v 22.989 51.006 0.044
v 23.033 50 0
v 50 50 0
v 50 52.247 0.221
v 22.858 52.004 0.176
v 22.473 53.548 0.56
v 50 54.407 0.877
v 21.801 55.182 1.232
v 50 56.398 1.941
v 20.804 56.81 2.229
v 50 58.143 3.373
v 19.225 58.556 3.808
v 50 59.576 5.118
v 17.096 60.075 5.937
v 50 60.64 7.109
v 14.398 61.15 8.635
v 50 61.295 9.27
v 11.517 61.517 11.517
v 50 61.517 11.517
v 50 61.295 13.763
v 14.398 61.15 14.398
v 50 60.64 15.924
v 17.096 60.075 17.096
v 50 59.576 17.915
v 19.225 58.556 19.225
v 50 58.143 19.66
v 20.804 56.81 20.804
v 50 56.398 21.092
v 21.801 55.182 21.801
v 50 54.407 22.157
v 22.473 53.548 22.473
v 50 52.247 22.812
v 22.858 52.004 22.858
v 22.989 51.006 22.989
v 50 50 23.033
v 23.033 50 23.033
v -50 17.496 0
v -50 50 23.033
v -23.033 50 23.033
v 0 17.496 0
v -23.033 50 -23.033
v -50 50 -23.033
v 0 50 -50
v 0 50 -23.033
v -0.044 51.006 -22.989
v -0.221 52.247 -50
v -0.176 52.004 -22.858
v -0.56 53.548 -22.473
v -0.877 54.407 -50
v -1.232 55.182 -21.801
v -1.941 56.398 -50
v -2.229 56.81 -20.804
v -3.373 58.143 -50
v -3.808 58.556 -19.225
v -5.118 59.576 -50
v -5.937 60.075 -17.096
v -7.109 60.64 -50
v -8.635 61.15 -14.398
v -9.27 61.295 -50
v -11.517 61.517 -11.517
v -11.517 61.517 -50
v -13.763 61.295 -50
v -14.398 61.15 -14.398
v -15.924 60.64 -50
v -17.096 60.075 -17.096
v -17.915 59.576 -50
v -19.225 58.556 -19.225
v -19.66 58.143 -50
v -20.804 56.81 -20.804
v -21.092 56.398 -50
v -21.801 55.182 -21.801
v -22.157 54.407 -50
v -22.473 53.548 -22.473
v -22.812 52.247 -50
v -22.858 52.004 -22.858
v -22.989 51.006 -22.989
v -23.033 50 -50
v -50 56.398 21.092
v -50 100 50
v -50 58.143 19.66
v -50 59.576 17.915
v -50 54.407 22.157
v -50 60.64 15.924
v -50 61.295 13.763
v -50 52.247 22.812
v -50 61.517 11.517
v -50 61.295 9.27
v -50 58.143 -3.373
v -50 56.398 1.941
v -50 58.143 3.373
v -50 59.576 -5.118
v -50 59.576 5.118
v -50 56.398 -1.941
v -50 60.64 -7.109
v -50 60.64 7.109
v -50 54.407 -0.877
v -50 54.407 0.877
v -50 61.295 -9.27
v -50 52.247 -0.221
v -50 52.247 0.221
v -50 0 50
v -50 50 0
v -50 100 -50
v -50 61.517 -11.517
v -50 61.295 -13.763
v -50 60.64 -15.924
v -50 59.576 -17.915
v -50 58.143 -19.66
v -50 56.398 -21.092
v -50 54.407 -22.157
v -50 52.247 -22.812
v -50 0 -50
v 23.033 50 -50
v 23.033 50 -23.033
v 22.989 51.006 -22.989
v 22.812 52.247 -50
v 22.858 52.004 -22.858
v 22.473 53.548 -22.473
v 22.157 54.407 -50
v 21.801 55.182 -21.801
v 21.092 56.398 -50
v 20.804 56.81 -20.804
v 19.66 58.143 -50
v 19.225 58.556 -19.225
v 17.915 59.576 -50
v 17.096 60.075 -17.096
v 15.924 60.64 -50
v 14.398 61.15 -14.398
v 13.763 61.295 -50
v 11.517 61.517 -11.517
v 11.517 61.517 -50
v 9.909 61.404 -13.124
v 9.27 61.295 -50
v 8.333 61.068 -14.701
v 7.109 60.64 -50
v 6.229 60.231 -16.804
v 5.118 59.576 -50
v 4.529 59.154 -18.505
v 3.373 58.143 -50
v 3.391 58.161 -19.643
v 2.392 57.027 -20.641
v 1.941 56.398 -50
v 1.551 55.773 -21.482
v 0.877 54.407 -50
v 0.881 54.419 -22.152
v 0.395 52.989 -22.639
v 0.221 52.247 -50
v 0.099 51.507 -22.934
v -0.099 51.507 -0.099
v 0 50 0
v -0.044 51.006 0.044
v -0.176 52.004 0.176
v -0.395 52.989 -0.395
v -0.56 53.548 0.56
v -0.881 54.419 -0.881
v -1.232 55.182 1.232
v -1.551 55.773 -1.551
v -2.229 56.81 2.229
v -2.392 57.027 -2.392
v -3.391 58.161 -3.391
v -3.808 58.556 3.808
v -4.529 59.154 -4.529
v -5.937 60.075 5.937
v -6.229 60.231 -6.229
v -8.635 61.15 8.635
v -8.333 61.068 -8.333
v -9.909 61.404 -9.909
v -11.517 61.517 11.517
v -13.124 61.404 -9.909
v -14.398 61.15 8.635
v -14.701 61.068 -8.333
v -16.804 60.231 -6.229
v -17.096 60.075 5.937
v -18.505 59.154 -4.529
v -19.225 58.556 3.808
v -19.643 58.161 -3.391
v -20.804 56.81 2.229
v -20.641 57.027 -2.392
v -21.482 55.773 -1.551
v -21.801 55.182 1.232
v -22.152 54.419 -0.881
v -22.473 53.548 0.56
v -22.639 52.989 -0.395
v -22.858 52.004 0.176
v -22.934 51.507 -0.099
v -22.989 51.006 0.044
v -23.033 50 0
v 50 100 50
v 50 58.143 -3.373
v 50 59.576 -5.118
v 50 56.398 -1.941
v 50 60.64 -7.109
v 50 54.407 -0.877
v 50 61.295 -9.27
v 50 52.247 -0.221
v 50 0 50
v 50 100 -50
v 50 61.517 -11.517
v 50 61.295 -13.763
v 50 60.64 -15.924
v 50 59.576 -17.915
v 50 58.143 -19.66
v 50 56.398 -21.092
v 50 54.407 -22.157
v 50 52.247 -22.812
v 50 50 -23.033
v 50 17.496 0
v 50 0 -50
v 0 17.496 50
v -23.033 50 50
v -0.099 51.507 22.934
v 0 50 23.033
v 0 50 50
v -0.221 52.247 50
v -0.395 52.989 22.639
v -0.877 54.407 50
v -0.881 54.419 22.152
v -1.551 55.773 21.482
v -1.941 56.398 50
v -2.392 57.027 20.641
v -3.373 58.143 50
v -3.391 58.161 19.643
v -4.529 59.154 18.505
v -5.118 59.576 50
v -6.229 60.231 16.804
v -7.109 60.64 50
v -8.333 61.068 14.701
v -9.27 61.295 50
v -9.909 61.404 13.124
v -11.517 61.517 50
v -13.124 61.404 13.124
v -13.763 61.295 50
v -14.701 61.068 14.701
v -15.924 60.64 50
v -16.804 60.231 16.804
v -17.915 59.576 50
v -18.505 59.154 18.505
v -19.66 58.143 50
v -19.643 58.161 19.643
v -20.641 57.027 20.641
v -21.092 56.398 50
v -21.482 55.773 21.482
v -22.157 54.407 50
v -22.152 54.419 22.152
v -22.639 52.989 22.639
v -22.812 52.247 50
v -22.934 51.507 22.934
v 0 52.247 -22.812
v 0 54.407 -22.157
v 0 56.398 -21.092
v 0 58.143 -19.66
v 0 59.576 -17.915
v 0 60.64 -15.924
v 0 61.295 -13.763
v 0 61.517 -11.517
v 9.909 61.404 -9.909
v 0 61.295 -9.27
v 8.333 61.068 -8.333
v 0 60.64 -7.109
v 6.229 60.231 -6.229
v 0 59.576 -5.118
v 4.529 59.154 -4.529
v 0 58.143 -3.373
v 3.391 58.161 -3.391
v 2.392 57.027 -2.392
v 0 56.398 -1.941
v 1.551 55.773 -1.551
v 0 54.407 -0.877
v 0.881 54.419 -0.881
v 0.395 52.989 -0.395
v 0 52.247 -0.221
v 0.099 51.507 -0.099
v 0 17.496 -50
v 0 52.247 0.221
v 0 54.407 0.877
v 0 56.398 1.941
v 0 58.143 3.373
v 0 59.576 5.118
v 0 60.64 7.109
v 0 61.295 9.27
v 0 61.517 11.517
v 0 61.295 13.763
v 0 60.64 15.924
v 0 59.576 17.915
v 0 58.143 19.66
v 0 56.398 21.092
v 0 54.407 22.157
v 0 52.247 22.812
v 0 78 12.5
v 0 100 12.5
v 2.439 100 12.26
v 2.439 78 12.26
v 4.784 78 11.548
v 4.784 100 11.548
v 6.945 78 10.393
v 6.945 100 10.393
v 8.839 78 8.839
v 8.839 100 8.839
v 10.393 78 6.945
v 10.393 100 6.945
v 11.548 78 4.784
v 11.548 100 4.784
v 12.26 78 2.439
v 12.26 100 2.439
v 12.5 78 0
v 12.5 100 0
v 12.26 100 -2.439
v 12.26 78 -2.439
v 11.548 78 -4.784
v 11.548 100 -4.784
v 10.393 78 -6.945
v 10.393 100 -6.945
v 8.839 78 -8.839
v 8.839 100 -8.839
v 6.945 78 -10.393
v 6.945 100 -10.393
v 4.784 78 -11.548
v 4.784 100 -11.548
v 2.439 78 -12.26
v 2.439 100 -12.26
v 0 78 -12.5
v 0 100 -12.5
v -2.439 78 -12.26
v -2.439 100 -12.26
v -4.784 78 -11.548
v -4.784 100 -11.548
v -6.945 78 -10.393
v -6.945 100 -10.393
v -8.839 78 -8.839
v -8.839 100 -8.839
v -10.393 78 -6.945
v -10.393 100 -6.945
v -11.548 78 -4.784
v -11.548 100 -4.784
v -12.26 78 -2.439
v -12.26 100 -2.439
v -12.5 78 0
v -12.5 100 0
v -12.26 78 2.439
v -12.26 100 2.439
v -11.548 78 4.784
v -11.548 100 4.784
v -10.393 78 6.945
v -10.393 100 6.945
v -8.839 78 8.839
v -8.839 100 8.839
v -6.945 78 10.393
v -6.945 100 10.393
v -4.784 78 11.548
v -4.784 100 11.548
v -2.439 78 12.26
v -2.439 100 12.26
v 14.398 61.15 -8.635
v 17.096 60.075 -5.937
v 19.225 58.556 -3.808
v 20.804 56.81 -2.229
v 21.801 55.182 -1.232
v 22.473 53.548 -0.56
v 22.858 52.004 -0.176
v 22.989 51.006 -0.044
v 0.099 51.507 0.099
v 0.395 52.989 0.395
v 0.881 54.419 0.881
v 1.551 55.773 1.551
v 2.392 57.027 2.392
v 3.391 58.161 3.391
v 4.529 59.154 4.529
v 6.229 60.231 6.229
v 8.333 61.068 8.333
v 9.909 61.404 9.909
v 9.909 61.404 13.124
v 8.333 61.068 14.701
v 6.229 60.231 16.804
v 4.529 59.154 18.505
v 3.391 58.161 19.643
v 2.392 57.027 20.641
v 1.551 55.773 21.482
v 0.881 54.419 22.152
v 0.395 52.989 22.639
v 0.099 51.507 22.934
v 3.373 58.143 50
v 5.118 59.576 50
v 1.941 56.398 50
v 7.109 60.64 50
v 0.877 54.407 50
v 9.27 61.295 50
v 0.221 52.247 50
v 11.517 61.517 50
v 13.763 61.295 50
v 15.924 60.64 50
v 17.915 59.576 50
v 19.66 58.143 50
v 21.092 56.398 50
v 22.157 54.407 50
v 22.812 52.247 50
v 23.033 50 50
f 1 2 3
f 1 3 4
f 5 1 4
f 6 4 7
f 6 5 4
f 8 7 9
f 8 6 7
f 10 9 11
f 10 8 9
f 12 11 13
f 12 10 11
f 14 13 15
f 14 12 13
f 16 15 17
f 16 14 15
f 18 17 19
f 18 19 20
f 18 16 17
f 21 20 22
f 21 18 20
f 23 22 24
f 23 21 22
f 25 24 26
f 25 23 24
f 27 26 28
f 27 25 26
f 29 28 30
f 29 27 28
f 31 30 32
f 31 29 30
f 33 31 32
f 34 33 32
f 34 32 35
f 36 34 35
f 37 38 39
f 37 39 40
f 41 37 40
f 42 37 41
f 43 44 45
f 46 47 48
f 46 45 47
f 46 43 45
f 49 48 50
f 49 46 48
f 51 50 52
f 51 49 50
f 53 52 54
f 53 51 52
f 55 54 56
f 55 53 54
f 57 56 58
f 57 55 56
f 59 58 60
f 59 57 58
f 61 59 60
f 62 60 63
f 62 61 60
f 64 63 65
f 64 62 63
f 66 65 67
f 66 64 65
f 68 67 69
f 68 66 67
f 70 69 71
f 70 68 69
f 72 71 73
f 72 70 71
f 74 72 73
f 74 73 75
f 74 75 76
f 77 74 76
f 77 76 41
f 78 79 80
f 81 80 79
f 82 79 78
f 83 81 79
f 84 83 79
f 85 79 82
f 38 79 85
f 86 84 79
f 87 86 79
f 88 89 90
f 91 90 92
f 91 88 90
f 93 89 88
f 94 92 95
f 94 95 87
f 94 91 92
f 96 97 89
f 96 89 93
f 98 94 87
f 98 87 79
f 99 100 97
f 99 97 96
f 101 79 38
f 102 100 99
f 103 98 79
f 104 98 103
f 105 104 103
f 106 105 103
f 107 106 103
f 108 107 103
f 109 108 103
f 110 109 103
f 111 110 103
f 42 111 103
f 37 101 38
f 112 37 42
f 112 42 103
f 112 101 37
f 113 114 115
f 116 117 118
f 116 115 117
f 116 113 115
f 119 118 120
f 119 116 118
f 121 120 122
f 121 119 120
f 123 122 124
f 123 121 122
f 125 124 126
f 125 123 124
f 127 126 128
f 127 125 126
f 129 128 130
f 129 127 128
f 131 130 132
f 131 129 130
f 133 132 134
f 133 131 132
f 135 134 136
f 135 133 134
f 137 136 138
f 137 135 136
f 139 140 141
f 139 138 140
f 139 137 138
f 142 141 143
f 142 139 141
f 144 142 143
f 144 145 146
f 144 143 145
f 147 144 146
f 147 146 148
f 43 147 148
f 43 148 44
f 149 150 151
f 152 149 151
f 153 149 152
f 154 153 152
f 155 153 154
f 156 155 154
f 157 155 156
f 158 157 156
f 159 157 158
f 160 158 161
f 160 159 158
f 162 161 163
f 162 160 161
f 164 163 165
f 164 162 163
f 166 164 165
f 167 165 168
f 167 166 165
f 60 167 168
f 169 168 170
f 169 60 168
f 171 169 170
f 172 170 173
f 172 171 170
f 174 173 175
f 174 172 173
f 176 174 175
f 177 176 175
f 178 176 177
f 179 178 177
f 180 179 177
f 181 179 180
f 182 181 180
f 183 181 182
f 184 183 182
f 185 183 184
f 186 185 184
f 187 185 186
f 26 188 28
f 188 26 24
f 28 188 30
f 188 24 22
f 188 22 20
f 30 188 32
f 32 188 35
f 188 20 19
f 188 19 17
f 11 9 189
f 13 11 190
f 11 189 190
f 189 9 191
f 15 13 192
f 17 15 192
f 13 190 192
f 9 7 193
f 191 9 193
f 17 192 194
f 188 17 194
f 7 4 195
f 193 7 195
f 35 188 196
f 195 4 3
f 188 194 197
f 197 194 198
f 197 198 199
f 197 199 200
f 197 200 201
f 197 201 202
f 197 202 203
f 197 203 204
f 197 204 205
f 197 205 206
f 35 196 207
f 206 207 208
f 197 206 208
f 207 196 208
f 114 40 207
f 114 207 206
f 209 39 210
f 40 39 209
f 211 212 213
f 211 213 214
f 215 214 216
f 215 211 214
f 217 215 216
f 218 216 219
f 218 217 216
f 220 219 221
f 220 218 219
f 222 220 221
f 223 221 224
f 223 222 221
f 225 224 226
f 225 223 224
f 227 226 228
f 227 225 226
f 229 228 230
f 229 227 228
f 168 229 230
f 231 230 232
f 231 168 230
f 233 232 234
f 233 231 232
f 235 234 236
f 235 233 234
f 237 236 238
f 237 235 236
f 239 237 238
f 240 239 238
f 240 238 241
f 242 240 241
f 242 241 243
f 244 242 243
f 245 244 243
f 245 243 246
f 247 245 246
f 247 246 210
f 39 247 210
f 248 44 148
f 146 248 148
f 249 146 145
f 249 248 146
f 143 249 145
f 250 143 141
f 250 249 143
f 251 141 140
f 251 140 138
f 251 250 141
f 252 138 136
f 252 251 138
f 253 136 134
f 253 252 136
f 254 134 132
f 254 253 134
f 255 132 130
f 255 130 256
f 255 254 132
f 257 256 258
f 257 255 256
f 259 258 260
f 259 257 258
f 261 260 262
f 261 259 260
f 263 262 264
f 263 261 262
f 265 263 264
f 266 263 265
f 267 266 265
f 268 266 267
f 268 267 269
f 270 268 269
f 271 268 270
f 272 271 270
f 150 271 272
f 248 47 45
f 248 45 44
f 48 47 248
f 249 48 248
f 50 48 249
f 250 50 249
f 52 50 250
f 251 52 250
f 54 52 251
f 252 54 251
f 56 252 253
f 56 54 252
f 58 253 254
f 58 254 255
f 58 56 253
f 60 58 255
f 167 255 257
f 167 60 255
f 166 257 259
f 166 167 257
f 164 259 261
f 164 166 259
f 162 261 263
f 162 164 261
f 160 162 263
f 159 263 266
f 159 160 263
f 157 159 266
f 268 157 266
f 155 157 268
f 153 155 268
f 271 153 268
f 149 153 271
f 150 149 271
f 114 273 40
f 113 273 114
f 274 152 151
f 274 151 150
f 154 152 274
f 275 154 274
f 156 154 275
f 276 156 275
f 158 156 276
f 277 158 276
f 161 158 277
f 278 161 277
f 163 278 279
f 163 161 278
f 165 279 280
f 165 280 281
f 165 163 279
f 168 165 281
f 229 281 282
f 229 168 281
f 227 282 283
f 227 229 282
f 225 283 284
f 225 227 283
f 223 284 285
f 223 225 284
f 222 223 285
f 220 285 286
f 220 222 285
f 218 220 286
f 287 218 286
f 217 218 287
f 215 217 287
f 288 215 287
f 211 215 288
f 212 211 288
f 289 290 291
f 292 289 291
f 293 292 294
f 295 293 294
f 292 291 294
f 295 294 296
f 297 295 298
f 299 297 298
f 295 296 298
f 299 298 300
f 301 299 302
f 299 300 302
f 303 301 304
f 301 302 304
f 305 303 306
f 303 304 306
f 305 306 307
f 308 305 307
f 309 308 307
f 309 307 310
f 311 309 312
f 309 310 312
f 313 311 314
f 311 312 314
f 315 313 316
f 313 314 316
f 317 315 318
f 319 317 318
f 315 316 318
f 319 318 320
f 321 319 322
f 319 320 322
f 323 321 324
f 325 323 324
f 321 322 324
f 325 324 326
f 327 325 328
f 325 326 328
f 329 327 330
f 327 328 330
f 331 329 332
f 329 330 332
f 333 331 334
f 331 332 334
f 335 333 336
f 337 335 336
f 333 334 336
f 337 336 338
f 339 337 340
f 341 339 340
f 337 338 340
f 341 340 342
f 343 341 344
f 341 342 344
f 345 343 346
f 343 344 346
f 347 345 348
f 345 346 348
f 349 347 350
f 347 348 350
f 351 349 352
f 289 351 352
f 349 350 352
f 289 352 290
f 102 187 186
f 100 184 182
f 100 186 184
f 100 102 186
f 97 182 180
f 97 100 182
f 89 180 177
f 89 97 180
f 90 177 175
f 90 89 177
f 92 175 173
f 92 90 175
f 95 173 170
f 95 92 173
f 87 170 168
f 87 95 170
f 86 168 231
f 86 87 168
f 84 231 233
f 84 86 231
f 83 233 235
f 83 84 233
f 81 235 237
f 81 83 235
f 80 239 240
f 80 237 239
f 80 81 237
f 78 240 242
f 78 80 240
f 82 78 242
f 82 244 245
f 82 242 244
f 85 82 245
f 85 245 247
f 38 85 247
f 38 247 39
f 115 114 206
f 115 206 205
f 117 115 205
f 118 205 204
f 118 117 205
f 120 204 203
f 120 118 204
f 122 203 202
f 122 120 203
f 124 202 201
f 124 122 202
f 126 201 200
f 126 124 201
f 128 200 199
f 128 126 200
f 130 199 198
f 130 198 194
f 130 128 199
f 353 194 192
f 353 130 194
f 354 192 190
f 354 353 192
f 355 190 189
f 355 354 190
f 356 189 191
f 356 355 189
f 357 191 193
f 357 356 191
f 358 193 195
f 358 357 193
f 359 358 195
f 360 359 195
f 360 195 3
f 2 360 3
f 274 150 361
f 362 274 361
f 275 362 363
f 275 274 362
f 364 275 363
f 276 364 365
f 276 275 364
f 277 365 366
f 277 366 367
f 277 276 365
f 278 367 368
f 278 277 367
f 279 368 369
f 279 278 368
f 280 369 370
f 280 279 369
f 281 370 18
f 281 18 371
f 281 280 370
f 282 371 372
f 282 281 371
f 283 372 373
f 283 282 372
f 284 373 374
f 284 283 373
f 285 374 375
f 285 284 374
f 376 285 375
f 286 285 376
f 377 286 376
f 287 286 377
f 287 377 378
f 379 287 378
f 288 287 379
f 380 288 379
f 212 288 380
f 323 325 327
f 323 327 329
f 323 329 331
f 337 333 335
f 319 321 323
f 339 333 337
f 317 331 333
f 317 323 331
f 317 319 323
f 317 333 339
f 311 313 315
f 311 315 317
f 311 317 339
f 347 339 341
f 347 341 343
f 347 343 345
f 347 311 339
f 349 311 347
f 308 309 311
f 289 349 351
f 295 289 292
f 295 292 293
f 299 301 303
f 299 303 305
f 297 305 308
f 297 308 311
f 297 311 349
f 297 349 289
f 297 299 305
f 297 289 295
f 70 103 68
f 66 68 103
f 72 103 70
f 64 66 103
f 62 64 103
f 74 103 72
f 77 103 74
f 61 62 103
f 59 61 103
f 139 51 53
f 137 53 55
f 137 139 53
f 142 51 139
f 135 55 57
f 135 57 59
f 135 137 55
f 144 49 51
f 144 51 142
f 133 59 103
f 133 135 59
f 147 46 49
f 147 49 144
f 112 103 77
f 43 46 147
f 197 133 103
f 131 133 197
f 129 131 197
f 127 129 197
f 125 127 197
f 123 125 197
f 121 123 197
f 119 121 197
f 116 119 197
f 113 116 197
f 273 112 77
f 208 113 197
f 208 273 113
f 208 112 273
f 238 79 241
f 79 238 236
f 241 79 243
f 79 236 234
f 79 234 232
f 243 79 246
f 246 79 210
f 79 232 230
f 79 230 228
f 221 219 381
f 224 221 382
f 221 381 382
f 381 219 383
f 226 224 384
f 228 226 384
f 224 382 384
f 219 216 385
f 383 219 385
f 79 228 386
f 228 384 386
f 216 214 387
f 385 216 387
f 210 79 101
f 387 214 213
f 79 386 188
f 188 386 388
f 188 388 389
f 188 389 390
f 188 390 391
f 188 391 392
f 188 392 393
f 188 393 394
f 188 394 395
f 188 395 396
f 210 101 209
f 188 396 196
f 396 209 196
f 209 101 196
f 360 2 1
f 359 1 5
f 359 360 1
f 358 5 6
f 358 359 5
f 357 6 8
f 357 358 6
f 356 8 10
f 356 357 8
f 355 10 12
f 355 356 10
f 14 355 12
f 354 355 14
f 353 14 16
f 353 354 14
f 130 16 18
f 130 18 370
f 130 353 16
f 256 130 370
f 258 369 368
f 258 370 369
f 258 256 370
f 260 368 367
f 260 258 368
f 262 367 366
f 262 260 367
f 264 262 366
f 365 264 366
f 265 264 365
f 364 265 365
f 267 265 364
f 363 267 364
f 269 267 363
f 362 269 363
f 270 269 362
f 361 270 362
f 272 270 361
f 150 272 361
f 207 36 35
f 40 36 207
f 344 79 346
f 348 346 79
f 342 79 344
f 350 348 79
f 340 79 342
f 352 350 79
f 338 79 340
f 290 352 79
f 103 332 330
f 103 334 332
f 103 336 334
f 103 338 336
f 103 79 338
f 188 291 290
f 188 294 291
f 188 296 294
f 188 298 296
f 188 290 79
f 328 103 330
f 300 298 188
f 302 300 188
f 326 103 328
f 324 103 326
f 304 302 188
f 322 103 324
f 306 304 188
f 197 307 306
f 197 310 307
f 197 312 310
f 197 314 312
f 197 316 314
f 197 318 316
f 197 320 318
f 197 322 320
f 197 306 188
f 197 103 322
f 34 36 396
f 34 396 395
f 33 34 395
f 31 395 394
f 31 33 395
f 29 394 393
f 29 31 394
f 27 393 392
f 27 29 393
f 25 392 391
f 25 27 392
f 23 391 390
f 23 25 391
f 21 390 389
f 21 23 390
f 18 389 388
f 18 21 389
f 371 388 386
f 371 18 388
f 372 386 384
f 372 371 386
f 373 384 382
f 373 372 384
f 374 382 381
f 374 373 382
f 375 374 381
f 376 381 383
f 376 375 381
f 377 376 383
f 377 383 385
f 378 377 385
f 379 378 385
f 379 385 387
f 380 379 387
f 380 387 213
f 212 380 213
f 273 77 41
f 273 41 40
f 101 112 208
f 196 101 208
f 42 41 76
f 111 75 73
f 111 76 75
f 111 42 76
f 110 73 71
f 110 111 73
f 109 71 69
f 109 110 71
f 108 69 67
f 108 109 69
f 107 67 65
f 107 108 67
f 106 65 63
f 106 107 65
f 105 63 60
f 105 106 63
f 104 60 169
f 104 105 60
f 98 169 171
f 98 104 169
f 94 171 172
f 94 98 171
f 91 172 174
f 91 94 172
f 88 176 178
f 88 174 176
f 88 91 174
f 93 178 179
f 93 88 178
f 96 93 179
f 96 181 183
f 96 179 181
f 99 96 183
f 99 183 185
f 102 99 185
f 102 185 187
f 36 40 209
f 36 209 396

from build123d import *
from build123d.topology import SkipClean

# Parameters (mm, degrees)
SKETCH1_W           = 100
SKETCH1_H           = 100
BOSS_EXTRUDE1_DEPTH = 100
CUT_EXTRUDE1_DEPTH  = 50
CIRPATTERN1_START   = -50
CIRPATTERN1_DEPTH   = 100
CIRPATTERN1_2_DEPTH = 50
SKETCH3_R           = 12.5
CUT_EXTRUDE2_DEPTH  = 22


with BuildPart() as part:
    # Sketch1 → Boss-Extrude1 (new body)
    with BuildSketch(Plane(origin=(0, 0, 0), x_dir=(1, 0, 0), z_dir=(0, 1, 0))):
        Rectangle(SKETCH1_W, SKETCH1_H)
    extrude(amount=BOSS_EXTRUDE1_DEPTH)

    # Sketch2 → Cut-Extrude1 (cut)
    with BuildSketch(Plane.ZY.offset(50)):
        with BuildLine():
            Line((0, 17.495781671), (-23.033292242, 50))
            ThreePointArc((-23.033292242, 50), (-11.516646121, 61.516646121), (0, 50))
            ThreePointArc((0, 50), (11.516646121, 61.516646121), (23.033292242, 50))
            Line((23.033292242, 50), (0, 17.495781671))
        make_face()
    extrude(amount=-CUT_EXTRUDE1_DEPTH, mode=Mode.SUBTRACT)

    # CirPattern1: read off the stored shape, not the designer's step
    # CirPattern1 outline → CirPattern1 (cut)
    with SkipClean():  # the faces are left unmerged after this step: merging them gives an invalid solid
        with BuildSketch(Plane.XY.offset(CIRPATTERN1_START)):
            with BuildLine():
                Line((-23.033292242, 50), (0, 17.495781671))
                Line((0, 17.495781671), (23.033292242, 50))
                ThreePointArc((23.033292242, 50), (11.516646121, 61.516646121), (0, 50))
                ThreePointArc((0, 50), (-11.516646121, 61.516646121), (-23.033292242, 50))
            make_face()
        extrude(amount=CIRPATTERN1_DEPTH, mode=Mode.SUBTRACT)

    # CirPattern1 2 outline → CirPattern1 2 (cut)
    with SkipClean():  # the faces are left unmerged after this step: merging them gives an invalid solid
        with BuildSketch(Plane.YZ):
            with BuildLine():
                Line((17.495781671, 0), (50, -23.033292242))
                ThreePointArc((50, -23.033292242), (61.516646121, -11.516646121), (50, 0))
                ThreePointArc((50, 0), (61.516646121, 11.516646121), (50, 23.033292242))
                Line((50, 23.033292242), (17.495781671, 0))
            make_face()
        extrude(amount=CIRPATTERN1_2_DEPTH, mode=Mode.SUBTRACT)

    # Sketch3 → Cut-Extrude2 (cut)
    with SkipClean():  # the faces are left unmerged after this step: merging them gives an invalid solid
        with BuildSketch(Plane(origin=(0, 100, 0), x_dir=(1, 0, 0), z_dir=(0, 1, 0))):
            with Locations(Location((0, 0, 0), (0, 0, 270))):
                Circle(SKETCH3_R)
        extrude(amount=-CUT_EXTRUDE2_DEPTH, mode=Mode.SUBTRACT)


solid = part.part
